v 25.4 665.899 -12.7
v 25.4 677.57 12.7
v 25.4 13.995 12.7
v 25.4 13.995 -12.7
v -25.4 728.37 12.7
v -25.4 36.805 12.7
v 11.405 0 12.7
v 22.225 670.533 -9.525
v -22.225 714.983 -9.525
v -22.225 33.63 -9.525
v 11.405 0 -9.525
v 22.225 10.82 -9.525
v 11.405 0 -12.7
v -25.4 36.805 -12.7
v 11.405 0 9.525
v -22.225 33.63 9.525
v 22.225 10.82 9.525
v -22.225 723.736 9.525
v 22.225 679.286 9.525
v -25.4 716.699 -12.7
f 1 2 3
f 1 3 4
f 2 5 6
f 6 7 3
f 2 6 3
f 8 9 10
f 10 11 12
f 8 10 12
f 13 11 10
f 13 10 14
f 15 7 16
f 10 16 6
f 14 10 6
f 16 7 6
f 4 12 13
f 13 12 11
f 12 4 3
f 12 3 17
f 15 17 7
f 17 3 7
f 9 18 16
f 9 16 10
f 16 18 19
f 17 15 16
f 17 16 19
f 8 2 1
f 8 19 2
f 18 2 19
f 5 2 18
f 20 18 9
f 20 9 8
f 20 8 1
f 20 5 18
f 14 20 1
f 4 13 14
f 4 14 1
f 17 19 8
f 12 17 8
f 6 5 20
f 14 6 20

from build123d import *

# Parameters (mm, degrees)
SKETCH1_W           = 50.8
SKETCH1_H           = 25.4
SKETCH1_W_2         = 44.45
SKETCH1_H_2         = 19.05
BOSS_EXTRUDE1_DEPTH = 728.3704
CUT_EXTRUDE1_DEPTH  = 730.255620202
CUT_EXTRUDE2_DEPTH  = 728.6244


with BuildPart() as part:
    # Sketch1 → Boss-Extrude1 (new body)
    with BuildSketch(Plane(origin=(0, 0, 0), x_dir=(1, 0, 0), z_dir=(0, 1, 0))):
        Rectangle(SKETCH1_W, SKETCH1_H)
        Rectangle(SKETCH1_W_2, SKETCH1_H_2, mode=Mode.SUBTRACT)
    extrude(amount=BOSS_EXTRUDE1_DEPTH)

    # Sketch2 → Cut-Extrude1 (cut, through all)
    with BuildSketch(Plane.XY.offset(12.7)):
        Polygon((25.4, 728.3704), (-25.4, 728.3704), (25.4, 677.5704), align=None)
        Polygon((11.4046, 0), (-25.4, 36.8046), (-25.4, 0), align=None)
        Polygon((25.4, 0), (25.4, 13.9954), (11.4046, 0), align=None)
    extrude(amount=-CUT_EXTRUDE1_DEPTH, mode=Mode.SUBTRACT)

    # Sketch3 → Cut-Extrude2 (cut)
    with BuildSketch(Plane(origin=(-376.8852, 376.8852, 0), x_dir=(0, 0, 1), z_dir=(-0.7071067811865563, 0.7071067811865388, 0))):
        Polygon((12.7, 497.075136813), (-12.7, 488.822176529), (-12.7, 497.075136813), align=None)
    extrude(amount=-CUT_EXTRUDE2_DEPTH, mode=Mode.SUBTRACT)


solid = part.part
